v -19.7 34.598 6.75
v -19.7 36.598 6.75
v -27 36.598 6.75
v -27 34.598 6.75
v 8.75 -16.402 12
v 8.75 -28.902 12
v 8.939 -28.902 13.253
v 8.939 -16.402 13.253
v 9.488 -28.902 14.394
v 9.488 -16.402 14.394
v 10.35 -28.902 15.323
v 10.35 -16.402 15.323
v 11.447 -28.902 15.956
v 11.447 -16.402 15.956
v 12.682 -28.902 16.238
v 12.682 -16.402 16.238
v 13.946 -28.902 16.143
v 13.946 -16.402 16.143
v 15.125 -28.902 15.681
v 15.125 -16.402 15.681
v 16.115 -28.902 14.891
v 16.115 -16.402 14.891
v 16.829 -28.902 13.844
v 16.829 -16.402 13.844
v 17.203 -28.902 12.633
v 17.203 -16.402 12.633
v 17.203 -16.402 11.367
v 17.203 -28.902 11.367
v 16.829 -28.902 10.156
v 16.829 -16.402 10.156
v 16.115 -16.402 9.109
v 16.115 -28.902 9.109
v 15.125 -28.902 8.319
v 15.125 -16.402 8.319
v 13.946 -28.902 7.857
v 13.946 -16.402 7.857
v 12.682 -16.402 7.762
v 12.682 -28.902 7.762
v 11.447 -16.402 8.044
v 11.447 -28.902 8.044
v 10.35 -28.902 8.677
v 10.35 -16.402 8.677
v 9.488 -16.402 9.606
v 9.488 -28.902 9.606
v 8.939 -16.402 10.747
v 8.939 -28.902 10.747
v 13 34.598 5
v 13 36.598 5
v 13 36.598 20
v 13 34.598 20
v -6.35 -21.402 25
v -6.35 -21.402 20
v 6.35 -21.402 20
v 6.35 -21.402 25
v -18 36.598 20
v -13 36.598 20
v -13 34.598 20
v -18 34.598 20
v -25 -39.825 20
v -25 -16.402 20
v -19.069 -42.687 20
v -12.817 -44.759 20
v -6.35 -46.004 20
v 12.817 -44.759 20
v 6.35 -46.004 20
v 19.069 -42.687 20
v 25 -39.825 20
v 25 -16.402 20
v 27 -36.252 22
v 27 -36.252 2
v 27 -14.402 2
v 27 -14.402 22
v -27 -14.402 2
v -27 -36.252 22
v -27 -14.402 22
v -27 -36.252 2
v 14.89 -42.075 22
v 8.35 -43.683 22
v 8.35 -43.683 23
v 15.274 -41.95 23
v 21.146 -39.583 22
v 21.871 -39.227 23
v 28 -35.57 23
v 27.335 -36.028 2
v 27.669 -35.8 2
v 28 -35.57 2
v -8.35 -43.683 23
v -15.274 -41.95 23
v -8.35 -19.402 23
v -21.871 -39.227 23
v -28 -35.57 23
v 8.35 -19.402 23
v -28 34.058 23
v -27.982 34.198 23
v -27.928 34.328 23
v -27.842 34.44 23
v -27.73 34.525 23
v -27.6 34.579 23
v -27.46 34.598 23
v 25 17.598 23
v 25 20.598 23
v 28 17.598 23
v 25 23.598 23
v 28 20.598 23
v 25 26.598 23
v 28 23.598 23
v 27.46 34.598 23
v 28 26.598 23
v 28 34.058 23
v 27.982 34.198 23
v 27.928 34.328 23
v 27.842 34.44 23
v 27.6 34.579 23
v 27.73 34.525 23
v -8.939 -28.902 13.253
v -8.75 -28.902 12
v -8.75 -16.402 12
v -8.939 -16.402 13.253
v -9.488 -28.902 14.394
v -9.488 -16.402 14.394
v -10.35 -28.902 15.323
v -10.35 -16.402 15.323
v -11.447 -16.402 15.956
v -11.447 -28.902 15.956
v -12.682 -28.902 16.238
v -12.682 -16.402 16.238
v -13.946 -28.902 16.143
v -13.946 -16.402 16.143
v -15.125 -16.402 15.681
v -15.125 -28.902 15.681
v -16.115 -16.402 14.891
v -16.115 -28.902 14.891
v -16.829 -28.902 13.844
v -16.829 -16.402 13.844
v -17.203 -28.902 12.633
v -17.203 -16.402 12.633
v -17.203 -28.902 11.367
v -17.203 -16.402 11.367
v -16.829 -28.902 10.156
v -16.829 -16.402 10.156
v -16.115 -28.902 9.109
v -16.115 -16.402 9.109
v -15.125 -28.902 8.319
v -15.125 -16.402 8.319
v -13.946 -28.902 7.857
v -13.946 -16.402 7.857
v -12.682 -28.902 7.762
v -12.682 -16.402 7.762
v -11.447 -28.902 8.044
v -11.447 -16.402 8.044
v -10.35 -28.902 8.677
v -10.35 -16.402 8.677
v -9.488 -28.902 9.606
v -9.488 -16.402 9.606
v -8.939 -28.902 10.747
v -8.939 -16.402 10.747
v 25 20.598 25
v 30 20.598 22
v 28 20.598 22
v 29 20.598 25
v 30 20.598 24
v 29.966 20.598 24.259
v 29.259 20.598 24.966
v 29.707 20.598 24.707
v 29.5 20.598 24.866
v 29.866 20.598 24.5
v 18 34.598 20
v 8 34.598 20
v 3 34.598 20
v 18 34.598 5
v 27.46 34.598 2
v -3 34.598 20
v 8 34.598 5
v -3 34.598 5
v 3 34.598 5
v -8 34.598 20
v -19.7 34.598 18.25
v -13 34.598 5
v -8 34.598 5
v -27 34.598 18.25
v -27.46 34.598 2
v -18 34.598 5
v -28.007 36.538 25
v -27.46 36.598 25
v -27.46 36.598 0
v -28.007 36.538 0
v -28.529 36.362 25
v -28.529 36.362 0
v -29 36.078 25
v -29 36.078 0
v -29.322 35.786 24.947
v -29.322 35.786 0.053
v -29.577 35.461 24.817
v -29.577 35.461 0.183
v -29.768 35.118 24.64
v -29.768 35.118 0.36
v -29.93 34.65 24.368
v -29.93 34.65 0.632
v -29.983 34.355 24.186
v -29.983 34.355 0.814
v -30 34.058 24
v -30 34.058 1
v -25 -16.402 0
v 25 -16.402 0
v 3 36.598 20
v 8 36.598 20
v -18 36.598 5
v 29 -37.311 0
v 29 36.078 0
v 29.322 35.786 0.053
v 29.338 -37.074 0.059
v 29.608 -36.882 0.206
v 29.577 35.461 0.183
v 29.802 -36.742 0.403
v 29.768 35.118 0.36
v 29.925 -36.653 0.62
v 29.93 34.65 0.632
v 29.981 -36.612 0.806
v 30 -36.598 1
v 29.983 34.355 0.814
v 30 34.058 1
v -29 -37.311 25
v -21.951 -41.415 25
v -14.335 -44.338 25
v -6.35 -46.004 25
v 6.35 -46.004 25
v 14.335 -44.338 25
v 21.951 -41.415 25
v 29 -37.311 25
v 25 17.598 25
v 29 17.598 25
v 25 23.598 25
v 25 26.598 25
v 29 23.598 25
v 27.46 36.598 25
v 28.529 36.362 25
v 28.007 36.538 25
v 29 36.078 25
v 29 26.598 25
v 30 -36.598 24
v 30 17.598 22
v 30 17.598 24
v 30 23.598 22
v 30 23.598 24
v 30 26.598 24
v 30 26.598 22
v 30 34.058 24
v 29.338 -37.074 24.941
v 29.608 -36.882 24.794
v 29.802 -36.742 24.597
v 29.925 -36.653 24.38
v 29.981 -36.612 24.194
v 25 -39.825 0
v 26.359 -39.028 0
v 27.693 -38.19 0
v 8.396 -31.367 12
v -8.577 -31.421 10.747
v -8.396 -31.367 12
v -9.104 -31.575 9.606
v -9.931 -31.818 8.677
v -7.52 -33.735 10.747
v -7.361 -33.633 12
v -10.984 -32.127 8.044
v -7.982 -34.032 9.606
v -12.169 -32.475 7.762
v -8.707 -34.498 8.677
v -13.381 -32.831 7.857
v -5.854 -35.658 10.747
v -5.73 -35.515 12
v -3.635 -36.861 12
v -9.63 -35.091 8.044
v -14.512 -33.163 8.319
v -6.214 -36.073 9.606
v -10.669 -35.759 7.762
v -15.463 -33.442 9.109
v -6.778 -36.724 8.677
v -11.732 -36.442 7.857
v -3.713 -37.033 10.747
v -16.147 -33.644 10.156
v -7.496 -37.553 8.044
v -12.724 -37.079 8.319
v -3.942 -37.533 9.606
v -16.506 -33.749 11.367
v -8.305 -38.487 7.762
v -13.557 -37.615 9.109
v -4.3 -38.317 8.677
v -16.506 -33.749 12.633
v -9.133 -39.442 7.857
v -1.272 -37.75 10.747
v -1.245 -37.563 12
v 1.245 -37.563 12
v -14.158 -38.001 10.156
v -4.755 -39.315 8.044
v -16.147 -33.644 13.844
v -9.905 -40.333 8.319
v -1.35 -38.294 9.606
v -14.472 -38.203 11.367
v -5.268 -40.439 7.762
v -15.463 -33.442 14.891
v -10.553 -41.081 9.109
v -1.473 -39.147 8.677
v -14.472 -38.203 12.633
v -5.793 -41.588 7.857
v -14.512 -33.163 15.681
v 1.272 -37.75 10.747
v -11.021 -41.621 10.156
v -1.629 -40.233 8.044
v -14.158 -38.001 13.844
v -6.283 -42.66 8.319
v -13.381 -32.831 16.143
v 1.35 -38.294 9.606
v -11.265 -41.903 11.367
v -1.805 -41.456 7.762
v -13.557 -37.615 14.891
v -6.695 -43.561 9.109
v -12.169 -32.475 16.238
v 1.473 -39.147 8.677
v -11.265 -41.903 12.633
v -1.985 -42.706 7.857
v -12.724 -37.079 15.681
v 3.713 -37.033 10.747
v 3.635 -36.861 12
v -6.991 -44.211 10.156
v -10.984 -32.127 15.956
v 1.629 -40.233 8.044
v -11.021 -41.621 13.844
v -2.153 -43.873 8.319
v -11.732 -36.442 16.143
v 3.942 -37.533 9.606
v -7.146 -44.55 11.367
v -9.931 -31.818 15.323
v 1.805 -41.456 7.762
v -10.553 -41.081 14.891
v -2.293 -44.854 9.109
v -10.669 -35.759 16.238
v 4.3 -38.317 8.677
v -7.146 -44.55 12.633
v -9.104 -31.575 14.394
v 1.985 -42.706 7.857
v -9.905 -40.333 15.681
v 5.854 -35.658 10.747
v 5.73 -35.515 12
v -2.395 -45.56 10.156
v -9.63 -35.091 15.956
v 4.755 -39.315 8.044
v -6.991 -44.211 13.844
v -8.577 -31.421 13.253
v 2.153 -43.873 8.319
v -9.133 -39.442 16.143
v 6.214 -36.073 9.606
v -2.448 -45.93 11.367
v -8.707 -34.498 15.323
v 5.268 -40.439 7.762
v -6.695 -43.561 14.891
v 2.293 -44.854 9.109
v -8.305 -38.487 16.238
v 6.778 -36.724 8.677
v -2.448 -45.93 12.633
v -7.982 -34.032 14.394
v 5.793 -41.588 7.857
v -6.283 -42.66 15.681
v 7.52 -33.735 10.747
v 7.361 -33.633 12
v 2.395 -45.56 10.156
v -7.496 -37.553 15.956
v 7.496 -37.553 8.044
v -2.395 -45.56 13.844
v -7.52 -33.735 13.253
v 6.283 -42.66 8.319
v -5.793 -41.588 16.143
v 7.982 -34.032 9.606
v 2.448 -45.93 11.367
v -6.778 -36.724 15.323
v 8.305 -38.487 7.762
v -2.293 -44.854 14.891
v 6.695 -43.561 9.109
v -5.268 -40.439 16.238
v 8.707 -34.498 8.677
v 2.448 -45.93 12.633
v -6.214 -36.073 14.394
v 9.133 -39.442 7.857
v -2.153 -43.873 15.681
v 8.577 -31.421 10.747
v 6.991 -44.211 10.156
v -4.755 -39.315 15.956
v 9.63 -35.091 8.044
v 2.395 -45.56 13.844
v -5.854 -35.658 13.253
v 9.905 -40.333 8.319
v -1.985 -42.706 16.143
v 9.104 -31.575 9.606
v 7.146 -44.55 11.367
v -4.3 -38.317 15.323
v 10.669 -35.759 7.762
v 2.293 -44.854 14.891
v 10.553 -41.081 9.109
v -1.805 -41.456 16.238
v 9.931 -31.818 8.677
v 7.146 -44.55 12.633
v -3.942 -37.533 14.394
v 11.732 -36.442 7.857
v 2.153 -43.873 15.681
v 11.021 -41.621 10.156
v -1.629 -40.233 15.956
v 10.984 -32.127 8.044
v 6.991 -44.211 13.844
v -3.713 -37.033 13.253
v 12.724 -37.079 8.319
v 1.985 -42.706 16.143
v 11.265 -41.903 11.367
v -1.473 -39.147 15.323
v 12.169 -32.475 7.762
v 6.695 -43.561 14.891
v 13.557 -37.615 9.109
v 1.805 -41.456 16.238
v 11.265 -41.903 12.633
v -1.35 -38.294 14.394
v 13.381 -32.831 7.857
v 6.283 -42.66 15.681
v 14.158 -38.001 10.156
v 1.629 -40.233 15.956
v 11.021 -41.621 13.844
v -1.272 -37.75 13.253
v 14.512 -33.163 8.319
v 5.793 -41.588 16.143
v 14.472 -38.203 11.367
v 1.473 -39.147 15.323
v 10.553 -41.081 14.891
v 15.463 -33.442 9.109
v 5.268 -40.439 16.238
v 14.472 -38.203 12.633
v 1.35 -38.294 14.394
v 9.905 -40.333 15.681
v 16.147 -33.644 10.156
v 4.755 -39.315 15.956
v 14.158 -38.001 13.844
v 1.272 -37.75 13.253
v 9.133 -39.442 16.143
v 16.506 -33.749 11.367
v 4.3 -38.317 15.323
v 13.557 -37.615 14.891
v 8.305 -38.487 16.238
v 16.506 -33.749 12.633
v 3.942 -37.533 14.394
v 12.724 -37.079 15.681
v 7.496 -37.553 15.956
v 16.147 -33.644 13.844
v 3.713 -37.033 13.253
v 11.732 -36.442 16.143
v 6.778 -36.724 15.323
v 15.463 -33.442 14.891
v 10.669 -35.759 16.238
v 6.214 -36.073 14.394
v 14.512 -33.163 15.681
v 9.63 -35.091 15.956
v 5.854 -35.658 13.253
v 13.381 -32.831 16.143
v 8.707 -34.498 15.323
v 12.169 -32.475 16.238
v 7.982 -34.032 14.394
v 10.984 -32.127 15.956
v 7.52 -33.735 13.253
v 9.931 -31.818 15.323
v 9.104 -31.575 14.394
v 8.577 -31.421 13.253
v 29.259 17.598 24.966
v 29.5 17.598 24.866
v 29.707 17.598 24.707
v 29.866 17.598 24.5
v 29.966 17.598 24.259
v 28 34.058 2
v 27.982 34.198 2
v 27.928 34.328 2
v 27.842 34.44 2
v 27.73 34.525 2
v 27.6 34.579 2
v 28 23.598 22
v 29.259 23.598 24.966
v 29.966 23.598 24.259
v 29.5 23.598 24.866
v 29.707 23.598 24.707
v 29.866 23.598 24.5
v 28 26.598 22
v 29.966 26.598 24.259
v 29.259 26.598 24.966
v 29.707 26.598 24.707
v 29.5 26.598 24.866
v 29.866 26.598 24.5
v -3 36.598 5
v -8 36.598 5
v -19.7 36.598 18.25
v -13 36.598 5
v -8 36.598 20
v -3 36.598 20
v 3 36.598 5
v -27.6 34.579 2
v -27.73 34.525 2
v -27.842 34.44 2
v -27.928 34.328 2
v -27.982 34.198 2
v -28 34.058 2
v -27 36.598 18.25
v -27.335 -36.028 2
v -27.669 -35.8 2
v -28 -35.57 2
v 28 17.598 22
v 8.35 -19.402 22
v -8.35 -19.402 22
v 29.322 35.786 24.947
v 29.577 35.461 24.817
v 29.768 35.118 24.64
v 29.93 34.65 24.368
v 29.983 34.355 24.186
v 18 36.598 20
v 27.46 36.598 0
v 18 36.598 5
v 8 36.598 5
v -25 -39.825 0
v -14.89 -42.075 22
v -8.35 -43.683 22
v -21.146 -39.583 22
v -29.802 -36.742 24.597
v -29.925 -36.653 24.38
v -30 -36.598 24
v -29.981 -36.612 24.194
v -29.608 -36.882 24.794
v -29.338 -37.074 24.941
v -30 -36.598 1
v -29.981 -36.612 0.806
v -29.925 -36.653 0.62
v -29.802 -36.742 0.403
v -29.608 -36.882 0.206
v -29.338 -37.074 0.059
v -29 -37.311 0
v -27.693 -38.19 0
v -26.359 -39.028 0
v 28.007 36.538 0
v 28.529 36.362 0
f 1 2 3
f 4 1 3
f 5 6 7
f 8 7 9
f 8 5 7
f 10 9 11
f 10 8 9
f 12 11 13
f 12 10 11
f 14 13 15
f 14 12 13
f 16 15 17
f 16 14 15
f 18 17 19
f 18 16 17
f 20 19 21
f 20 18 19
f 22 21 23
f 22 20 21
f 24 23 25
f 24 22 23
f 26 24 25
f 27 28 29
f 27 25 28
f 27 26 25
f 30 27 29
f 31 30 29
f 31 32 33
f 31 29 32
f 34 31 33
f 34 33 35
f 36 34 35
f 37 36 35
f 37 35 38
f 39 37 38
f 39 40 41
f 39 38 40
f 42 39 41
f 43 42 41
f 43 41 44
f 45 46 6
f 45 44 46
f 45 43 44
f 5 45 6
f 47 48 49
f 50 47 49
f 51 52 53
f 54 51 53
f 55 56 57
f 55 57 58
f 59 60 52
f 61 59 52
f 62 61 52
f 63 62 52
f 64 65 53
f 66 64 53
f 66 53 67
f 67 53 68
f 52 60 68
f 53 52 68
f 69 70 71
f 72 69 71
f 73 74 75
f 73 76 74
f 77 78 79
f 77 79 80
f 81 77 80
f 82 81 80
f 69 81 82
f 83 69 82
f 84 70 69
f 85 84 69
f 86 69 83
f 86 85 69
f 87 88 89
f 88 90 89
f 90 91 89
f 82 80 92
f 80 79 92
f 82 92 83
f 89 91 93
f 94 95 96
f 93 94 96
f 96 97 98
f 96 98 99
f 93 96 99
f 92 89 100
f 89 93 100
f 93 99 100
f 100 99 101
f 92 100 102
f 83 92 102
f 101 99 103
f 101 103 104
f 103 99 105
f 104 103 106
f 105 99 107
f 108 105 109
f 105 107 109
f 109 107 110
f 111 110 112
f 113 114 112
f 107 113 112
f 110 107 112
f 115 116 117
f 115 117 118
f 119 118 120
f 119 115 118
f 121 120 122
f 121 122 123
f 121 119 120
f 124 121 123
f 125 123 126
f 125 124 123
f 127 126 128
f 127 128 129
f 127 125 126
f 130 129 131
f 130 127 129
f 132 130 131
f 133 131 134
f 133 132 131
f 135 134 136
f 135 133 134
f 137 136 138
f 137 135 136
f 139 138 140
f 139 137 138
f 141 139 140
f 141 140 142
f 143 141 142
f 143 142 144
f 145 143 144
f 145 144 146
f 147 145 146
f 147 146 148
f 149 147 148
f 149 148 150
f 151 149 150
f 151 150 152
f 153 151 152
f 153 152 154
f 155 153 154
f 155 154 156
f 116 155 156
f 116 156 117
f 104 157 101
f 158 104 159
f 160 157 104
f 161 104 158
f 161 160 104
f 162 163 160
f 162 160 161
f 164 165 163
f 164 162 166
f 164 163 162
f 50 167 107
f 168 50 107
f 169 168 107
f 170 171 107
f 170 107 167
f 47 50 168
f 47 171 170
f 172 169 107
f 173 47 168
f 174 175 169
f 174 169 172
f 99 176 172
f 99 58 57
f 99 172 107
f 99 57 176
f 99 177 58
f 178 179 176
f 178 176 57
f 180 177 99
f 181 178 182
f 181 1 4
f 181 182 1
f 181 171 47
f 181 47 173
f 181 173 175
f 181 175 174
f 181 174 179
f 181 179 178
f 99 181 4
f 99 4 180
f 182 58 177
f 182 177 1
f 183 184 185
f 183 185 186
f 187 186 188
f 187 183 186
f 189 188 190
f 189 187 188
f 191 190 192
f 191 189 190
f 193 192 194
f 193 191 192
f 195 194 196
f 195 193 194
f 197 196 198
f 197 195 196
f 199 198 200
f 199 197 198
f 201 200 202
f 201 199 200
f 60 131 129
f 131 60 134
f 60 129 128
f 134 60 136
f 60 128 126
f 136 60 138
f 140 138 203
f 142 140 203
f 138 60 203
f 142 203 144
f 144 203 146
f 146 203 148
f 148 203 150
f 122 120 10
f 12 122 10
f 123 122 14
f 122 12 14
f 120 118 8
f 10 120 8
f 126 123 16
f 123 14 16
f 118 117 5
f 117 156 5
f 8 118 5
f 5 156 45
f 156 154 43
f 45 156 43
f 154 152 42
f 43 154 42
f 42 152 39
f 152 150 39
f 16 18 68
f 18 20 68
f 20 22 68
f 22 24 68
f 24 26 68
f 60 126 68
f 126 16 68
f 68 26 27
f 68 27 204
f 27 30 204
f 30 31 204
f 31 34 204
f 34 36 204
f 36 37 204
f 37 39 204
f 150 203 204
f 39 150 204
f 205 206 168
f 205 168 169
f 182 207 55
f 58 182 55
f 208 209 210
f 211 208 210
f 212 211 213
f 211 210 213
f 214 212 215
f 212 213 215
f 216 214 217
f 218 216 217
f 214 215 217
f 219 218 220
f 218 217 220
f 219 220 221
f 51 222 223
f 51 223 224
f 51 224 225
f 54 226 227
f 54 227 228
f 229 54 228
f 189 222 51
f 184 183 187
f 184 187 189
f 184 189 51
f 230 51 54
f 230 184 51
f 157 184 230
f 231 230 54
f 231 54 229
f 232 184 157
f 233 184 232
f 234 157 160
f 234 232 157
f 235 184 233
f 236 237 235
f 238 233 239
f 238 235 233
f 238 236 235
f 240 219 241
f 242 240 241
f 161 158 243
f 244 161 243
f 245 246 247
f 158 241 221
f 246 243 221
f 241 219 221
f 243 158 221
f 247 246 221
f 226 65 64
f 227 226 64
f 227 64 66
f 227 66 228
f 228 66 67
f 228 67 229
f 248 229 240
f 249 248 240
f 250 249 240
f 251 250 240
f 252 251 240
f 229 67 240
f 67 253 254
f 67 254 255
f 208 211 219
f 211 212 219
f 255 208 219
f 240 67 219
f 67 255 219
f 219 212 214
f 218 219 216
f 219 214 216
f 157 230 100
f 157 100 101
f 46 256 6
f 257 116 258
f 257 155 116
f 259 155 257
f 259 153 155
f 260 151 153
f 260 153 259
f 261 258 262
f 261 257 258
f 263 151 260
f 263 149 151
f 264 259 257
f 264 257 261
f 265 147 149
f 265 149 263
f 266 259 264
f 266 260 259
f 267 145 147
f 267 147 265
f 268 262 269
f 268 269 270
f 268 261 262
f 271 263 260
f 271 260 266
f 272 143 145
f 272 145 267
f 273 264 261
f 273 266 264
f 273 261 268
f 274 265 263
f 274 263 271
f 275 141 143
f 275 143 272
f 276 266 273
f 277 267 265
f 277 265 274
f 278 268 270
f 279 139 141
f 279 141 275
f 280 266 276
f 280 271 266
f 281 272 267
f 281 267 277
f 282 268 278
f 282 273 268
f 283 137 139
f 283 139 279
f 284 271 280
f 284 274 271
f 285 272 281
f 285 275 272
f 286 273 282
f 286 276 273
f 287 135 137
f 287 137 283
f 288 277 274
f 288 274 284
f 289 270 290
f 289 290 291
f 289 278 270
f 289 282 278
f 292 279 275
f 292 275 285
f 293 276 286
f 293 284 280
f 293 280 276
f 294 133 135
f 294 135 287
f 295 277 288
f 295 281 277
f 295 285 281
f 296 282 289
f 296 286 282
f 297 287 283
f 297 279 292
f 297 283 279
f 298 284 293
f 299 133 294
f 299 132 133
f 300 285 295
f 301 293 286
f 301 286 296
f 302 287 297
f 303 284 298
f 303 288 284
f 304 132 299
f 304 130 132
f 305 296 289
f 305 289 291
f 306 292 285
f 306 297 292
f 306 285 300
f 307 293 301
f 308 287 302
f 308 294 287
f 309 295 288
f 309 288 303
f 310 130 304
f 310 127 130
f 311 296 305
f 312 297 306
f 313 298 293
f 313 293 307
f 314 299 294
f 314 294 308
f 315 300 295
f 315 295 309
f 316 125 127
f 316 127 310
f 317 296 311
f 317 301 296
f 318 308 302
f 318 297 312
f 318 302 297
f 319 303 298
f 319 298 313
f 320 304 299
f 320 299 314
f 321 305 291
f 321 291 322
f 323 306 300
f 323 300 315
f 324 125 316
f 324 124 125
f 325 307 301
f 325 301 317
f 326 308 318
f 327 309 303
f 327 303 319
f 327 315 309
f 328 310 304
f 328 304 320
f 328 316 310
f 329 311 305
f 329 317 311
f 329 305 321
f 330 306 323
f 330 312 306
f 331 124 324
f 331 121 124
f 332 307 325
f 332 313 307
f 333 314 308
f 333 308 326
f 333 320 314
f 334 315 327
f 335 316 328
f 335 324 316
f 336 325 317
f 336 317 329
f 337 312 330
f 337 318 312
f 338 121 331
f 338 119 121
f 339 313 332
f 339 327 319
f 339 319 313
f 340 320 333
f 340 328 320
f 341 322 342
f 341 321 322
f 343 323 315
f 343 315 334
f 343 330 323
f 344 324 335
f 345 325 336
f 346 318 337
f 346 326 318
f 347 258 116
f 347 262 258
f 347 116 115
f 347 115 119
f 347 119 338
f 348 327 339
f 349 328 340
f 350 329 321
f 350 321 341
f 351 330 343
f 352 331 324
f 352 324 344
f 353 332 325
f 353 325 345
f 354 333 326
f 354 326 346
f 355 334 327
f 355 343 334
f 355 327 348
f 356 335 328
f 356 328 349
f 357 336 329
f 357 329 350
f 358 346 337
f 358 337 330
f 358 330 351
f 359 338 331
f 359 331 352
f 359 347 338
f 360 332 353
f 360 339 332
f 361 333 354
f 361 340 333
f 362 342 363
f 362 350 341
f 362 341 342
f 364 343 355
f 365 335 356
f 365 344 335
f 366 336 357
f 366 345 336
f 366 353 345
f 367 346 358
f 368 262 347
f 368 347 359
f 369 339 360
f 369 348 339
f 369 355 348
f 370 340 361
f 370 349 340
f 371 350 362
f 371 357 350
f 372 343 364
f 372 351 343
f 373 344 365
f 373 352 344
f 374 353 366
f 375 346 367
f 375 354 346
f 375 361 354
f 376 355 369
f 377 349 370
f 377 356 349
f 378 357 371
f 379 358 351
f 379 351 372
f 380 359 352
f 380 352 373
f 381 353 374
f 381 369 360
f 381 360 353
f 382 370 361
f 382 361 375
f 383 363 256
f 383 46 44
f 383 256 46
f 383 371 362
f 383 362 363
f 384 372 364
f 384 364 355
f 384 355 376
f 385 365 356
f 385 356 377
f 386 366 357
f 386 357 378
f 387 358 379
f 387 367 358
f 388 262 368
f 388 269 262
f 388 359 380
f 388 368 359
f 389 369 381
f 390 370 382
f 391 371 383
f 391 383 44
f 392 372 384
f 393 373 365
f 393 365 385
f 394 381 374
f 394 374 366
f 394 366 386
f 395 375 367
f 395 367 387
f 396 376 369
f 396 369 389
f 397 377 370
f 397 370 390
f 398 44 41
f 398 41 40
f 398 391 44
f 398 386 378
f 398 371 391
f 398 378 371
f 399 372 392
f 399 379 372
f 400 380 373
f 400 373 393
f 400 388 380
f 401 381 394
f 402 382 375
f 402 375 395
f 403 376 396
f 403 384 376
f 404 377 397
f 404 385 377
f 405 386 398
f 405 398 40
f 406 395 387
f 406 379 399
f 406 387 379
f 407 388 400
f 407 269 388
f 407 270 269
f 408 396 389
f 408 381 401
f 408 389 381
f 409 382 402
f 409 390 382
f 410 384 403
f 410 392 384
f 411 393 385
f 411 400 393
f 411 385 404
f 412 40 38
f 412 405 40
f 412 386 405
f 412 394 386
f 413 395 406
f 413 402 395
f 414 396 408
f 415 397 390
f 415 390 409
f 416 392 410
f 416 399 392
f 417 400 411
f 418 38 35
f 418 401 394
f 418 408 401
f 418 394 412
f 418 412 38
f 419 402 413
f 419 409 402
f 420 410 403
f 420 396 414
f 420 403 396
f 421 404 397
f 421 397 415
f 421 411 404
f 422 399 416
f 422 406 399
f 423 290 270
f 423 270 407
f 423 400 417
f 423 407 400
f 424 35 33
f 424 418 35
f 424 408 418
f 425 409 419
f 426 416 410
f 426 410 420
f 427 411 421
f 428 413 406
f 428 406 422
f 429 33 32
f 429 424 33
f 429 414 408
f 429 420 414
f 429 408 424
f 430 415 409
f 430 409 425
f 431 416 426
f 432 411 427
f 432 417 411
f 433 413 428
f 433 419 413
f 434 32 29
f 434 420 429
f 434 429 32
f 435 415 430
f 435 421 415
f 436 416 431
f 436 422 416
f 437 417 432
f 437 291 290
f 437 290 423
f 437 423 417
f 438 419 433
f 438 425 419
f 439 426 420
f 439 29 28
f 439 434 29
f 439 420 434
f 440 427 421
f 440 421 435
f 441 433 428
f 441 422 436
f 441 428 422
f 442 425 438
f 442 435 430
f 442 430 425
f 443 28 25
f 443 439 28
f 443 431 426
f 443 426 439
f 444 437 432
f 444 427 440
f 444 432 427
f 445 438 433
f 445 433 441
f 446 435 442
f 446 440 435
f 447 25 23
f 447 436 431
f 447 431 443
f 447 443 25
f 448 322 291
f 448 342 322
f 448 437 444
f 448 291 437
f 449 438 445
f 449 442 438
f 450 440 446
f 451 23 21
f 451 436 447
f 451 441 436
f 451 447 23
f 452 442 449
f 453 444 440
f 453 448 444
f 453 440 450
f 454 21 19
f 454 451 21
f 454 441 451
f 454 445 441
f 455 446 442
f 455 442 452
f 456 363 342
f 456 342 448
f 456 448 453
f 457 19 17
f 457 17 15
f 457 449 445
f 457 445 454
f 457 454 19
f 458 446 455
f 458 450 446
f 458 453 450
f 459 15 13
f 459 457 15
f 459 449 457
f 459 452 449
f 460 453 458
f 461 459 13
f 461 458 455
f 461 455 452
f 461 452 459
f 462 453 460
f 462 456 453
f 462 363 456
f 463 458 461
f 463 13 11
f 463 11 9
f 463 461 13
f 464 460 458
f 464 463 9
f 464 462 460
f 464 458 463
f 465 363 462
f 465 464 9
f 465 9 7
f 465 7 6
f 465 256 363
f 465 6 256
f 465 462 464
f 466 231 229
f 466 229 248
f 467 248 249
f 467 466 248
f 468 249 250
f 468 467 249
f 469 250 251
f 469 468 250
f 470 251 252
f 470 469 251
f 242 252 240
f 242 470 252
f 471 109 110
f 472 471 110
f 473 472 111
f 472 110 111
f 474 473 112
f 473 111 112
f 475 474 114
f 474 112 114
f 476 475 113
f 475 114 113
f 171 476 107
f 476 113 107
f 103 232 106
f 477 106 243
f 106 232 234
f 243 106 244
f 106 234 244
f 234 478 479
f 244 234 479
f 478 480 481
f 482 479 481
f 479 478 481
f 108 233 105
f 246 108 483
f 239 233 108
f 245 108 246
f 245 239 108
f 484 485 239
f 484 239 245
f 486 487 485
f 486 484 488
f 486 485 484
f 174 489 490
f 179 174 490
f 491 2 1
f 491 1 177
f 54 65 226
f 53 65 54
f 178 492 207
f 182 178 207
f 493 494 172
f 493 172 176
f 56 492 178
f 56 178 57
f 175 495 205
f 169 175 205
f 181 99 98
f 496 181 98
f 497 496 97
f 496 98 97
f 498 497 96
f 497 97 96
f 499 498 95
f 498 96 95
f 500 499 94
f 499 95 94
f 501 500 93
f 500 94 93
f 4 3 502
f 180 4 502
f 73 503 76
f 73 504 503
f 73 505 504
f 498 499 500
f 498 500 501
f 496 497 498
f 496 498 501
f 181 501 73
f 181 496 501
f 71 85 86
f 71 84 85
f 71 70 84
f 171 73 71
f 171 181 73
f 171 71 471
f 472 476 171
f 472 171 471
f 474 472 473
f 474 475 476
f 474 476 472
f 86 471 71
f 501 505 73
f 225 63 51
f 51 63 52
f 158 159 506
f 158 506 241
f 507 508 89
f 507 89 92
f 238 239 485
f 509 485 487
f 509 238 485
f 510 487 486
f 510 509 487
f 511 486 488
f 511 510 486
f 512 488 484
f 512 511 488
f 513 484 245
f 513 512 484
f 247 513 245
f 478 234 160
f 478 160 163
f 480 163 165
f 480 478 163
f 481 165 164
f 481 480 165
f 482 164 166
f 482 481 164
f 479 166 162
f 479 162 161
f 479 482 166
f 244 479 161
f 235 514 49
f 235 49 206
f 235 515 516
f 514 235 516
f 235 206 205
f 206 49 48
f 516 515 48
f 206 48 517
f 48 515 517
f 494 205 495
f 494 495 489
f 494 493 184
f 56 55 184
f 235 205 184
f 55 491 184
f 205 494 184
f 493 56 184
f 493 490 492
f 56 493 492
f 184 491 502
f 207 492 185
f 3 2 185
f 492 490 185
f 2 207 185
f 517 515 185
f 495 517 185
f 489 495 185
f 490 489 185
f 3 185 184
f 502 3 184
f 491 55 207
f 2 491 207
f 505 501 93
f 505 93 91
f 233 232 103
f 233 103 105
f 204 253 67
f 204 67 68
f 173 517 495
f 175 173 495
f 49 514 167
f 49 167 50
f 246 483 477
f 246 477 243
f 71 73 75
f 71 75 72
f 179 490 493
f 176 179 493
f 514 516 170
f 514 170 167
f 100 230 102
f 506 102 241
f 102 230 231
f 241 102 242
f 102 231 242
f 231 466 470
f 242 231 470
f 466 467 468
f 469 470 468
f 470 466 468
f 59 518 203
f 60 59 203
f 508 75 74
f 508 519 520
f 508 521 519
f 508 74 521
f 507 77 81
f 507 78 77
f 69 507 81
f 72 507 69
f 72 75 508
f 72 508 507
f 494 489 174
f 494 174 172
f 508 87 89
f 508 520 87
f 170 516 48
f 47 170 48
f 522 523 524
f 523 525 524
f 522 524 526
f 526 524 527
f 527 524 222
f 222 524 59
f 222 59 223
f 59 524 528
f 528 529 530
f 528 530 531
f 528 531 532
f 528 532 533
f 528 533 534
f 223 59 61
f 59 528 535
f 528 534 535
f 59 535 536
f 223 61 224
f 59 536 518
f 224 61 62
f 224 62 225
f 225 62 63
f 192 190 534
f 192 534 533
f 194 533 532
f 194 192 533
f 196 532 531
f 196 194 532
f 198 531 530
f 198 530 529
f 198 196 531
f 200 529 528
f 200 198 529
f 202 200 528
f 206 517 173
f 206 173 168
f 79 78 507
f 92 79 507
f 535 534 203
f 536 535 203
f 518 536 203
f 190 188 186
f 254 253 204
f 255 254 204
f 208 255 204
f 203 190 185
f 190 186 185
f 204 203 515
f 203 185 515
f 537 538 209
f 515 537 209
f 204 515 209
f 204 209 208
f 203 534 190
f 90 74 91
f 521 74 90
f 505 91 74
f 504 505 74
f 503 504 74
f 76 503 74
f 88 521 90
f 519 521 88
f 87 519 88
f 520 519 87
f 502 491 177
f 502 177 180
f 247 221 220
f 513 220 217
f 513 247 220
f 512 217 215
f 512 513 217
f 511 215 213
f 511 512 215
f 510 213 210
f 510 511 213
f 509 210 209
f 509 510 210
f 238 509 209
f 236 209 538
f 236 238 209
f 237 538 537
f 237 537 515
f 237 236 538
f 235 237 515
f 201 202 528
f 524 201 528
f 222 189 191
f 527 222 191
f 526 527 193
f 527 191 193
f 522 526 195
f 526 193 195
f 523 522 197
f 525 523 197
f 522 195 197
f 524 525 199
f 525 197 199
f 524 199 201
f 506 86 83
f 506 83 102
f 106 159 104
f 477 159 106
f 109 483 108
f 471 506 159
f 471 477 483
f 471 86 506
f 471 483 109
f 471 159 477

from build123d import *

# Parameters (mm, degrees)
F1_DEPTH    = 25
F3_R        = 2.54
F4_W        = 50
F4_H        = 30
F5_DEPTH    = 20
F2_W        = 12.7
F2_H        = 25
F6_DEPTH    = 25
F7_T        = -2
F8_T1_DEPTH = 75.655609521
F10_W       = 5
F10_H       = 15
F11_DEPTH   = 10
F12_W       = 7.3
F12_H       = 11.5
F13_DEPTH   = 25.4
F16_R       = 4.25
F18_W       = 5
F18_H       = 3
F19_DEPTH   = 3


# Not quite as in the source:
# - a fillet or chamfer that OpenCascade refuses, or shapes differently, is made with other operations: its cross-section is extruded or revolved along the edge and cut away or added
# - a feature names something its author has since deleted; it is built from what else it names


with BuildPart() as f1:
    # F0 (on Top) → F1 (new body)
    with BuildSketch(Plane.XY):
        with BuildLine():
            Line((30, -36.5978047605), (30, 36.5978047605))
            Line((30, 36.5978047605), (-30, 36.5978047605))
            Line((-30, 36.5978047605), (-30, -36.5978047605))
            ThreePointArc((-30, -36.5978047605), (0, -46.4021952395), (30, -36.5978047605))
        make_face()
    extrude(amount=F1_DEPTH)

    # F3
    f3_edges = [f1.edges().sort_by_distance(p)[0] for p in [
        (-30, 36.597805, 12.5),
        (30, 36.597805, 12.5),
    ]]
    fillet(f3_edges, radius=F3_R)

    # F4 (on face) → F5 (cut)
    with BuildSketch(Plane.XY):
        with Locations((0, -31.4021952395)):
            Rectangle(F4_W, F4_H)
    extrude(amount=F5_DEPTH, mode=Mode.SUBTRACT)

    # F2 (on Top) → F6 (cut, through all)
    with BuildSketch(Plane.XY):
        with Locations((0, -33.9021952395)):
            Rectangle(F2_W, F2_H)
    extrude(amount=F6_DEPTH, mode=Mode.SUBTRACT)

    # F7 (hollow: no face is removed)
    offset(amount=F7_T, kind=Kind.INTERSECTION, mode=Mode.SUBTRACT)

    # F8: fillet of radius 1 on 4 edges, made by hand

    # F8_s2 → F8_t1 (cut)
    with BuildSketch(Plane.XZ.offset(-36.5578047605)):
        with BuildLine():
            ThreePointArc((29, 0), (29.7071067812, 0.2928932188), (30, 1))
            Line((30, 1), (30, 0))
            Line((30, 0), (29, 0))
        make_face()
        with BuildLine():
            ThreePointArc((29, 25), (29.7071067812, 24.7071067812), (30, 24))
            Line((30, 24), (30, 25))
            Line((30, 25), (29, 25))
        make_face()
        with BuildLine():
            ThreePointArc((-29, 25), (-29.7071067812, 24.7071067812), (-30, 24))
            Line((-30, 24), (-30, 25))
            Line((-30, 25), (-29, 25))
        make_face()
        with BuildLine():
            ThreePointArc((-29, 0), (-29.7071067812, 0.2928932188), (-30, 1))
            Line((-30, 1), (-30, 0))
            Line((-30, 0), (-29, 0))
        make_face()
    extrude(amount=F8_T1_DEPTH, mode=Mode.SUBTRACT)

    # F10 (on face) → F11 (cut)
    with BuildSketch(Plane(origin=(0, 36.5978047605, 0), x_dir=(-1, 0, 0), z_dir=(0, 1, 0))):
        with Locations((-15.5, 12.5)):
            Rectangle(F10_W, F10_H)
        with Locations((15.5, 12.5)):
            Rectangle(F10_W, F10_H)
        with Locations((-5.5, 12.5)):
            Rectangle(F10_W, F10_H)
        with Locations((5.5, 12.5)):
            Rectangle(F10_W, F10_H)
    extrude(amount=-F11_DEPTH, mode=Mode.SUBTRACT)

    # F12 (on face) → F13 (cut)
    with BuildSketch(Plane(origin=(0, 36.5978047605, 0), x_dir=(-1, 0, 0), z_dir=(0, 1, 0))):
        with Locations((23.35, 12.5)):
            Rectangle(F12_W, F12_H)
    extrude(amount=-F13_DEPTH, mode=Mode.SUBTRACT)

    # F17: sweep along a path in F15
    with BuildLine(Plane.XY.offset(12)) as f17_path:
        Line((-13, -16.4021952395), (-13, -28.9021952395))
        ThreePointArc((-13, -28.9021952395), (0, -41.9021952395), (13, -28.9021952395))
        Line((13, -28.9021952395), (13, -16.4021952395))
    # F16 (on face) → F17 (sweep)
    with BuildSketch(Plane.XZ.offset(16.4021952395)):
        with Locations((-13.0000123754, 11.9999870658)):
            Circle(F16_R)
    sweep(path=f17_path.line)

    # F18 (on face) → F19 (cut)
    with BuildSketch(Plane.XY.offset(25)):
        with Locations((27.5, 25.0978047605)):
            Rectangle(F18_W, F18_H)
        with Locations((27.5, 19.0978047605)):
            Rectangle(F18_W, F18_H)
    extrude(amount=-F19_DEPTH, mode=Mode.SUBTRACT)


solid = f1.part
